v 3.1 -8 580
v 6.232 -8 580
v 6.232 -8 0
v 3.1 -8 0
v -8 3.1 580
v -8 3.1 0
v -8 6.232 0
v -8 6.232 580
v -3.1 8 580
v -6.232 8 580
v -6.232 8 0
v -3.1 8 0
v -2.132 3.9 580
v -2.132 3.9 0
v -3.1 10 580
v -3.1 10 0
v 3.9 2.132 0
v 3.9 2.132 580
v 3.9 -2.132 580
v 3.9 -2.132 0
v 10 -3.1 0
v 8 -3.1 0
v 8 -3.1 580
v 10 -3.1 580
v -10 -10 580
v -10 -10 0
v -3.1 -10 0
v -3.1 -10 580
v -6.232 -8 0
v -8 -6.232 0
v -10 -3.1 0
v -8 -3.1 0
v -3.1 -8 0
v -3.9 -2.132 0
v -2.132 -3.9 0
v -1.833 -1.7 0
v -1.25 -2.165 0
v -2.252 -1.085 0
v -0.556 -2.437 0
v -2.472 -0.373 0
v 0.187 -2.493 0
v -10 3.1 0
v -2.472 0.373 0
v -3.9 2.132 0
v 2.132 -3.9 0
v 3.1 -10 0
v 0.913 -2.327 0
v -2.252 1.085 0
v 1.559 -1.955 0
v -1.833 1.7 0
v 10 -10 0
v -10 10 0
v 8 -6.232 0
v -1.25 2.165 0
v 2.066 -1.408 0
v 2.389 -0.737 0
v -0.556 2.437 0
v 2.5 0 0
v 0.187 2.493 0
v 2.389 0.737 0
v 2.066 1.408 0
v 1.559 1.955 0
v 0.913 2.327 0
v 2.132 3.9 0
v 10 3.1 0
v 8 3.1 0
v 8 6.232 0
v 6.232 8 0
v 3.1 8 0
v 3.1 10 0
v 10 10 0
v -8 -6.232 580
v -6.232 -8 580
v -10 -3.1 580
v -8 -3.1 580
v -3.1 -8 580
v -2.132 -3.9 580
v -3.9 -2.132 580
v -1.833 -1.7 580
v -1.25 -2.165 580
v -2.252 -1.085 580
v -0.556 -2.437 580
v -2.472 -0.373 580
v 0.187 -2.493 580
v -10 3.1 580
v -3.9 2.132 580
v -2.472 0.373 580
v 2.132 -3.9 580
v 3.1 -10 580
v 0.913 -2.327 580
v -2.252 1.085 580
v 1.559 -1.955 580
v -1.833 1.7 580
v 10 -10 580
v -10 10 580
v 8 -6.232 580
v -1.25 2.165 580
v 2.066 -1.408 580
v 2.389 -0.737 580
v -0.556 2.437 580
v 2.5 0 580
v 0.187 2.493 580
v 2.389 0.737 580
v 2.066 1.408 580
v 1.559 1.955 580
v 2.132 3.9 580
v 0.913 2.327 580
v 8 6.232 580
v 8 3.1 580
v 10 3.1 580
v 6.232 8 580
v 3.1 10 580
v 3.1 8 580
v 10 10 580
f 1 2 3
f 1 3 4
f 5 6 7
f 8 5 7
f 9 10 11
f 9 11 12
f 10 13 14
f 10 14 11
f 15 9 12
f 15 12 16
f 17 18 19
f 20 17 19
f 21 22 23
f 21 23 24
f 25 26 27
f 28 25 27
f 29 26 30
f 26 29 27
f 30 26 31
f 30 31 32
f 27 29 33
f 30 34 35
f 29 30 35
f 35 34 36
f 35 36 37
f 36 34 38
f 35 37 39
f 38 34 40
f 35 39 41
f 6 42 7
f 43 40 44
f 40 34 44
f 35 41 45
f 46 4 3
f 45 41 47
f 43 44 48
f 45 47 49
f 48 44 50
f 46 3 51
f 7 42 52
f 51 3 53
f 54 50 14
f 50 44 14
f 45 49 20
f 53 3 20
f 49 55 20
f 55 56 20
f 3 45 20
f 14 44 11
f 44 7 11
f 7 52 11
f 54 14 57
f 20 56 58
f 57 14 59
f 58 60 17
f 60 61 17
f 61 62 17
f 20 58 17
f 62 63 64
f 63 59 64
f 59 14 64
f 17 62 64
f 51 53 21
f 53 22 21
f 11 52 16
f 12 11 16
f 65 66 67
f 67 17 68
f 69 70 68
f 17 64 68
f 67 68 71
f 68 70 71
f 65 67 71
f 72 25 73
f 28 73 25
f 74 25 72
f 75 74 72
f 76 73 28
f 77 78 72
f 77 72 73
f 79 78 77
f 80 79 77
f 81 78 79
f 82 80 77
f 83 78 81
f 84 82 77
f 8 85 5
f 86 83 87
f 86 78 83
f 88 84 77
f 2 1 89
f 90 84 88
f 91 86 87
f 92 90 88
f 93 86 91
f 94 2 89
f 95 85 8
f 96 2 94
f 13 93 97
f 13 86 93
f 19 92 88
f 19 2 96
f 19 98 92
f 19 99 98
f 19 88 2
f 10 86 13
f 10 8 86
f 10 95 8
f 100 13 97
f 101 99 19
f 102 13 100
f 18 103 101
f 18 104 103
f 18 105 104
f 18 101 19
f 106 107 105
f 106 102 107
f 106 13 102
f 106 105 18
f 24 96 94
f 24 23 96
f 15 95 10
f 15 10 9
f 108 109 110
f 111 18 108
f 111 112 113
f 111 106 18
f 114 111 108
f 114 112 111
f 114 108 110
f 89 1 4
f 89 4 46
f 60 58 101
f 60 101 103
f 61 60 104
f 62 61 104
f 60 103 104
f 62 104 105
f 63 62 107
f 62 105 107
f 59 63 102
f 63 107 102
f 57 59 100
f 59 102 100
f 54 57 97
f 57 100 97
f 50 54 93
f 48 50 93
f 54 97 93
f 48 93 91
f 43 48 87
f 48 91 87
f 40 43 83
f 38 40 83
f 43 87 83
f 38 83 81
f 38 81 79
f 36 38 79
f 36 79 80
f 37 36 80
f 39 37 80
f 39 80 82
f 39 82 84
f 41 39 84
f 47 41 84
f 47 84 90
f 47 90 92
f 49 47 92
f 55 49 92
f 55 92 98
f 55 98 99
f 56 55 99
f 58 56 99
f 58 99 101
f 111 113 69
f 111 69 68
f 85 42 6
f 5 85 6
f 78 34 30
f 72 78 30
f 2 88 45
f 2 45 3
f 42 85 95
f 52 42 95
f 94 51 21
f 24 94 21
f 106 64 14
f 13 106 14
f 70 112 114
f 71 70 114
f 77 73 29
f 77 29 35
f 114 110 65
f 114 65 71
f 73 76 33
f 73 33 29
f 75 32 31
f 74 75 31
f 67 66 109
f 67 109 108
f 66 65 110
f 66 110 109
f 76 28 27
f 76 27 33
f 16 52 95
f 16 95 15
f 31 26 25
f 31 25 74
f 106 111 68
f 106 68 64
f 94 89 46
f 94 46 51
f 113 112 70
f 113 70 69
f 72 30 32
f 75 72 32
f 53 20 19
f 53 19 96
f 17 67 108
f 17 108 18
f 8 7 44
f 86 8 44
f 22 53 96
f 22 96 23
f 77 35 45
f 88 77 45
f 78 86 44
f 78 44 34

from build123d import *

# Parameters (mm, degrees)
SKETCH_W        = 20
SKETCH_H        = 20
PAD_DEPTH       = 580
SKETCH001_R     = 2.5
POCKET_DEPTH    = 580.001
POCKET001_DEPTH = 580.001


with BuildPart() as part:
    # Sketch → Pad (new body)
    with BuildSketch(Plane.XY):
        Rectangle(SKETCH_W, SKETCH_H)
    extrude(amount=PAD_DEPTH)

    # Sketch001 (on Face6 of Pad) → Pocket (cut, through all)
    with BuildSketch(Plane.XY.offset(580)):
        Circle(SKETCH001_R)
        Polygon((-3.1, 10), (3.1, 10), (3.1, 8), (6.232233, 8), (2.132233, 3.9), (-2.132233, 3.9), (-6.232233, 8), (-3.1, 8), align=None)
        Polygon((-3.1, -8), (-6.232233, -8), (-2.132233, -3.9), (2.132233, -3.9), (6.232233, -8), (3.1, -8), (3.1, -10), (-3.1, -10), align=None)
    extrude(amount=-POCKET_DEPTH, mode=Mode.SUBTRACT)

    # Sketch002 (on Face2 of Pocket) → Pocket001 (cut, through all)
    with BuildSketch(Plane(origin=(0, 0, 0), x_dir=(1, 0, 0), z_dir=(0, 0, -1))):
        Polygon((-10, -3.1), (-8, -3.1), (-8, -6.232233), (-3.9, -2.132233), (-3.9, 2.132233), (-8, 6.232233), (-8, 3.1), (-10, 3.1), align=None)
        Polygon((3.9, -2.132233), (3.9, 2.132233), (8, 6.232233), (8, 3.1), (10, 3.1), (10, -3.1), (8, -3.1), (8, -6.232233), align=None)
    extrude(amount=-POCKET001_DEPTH, mode=Mode.SUBTRACT)


solid = part.part
